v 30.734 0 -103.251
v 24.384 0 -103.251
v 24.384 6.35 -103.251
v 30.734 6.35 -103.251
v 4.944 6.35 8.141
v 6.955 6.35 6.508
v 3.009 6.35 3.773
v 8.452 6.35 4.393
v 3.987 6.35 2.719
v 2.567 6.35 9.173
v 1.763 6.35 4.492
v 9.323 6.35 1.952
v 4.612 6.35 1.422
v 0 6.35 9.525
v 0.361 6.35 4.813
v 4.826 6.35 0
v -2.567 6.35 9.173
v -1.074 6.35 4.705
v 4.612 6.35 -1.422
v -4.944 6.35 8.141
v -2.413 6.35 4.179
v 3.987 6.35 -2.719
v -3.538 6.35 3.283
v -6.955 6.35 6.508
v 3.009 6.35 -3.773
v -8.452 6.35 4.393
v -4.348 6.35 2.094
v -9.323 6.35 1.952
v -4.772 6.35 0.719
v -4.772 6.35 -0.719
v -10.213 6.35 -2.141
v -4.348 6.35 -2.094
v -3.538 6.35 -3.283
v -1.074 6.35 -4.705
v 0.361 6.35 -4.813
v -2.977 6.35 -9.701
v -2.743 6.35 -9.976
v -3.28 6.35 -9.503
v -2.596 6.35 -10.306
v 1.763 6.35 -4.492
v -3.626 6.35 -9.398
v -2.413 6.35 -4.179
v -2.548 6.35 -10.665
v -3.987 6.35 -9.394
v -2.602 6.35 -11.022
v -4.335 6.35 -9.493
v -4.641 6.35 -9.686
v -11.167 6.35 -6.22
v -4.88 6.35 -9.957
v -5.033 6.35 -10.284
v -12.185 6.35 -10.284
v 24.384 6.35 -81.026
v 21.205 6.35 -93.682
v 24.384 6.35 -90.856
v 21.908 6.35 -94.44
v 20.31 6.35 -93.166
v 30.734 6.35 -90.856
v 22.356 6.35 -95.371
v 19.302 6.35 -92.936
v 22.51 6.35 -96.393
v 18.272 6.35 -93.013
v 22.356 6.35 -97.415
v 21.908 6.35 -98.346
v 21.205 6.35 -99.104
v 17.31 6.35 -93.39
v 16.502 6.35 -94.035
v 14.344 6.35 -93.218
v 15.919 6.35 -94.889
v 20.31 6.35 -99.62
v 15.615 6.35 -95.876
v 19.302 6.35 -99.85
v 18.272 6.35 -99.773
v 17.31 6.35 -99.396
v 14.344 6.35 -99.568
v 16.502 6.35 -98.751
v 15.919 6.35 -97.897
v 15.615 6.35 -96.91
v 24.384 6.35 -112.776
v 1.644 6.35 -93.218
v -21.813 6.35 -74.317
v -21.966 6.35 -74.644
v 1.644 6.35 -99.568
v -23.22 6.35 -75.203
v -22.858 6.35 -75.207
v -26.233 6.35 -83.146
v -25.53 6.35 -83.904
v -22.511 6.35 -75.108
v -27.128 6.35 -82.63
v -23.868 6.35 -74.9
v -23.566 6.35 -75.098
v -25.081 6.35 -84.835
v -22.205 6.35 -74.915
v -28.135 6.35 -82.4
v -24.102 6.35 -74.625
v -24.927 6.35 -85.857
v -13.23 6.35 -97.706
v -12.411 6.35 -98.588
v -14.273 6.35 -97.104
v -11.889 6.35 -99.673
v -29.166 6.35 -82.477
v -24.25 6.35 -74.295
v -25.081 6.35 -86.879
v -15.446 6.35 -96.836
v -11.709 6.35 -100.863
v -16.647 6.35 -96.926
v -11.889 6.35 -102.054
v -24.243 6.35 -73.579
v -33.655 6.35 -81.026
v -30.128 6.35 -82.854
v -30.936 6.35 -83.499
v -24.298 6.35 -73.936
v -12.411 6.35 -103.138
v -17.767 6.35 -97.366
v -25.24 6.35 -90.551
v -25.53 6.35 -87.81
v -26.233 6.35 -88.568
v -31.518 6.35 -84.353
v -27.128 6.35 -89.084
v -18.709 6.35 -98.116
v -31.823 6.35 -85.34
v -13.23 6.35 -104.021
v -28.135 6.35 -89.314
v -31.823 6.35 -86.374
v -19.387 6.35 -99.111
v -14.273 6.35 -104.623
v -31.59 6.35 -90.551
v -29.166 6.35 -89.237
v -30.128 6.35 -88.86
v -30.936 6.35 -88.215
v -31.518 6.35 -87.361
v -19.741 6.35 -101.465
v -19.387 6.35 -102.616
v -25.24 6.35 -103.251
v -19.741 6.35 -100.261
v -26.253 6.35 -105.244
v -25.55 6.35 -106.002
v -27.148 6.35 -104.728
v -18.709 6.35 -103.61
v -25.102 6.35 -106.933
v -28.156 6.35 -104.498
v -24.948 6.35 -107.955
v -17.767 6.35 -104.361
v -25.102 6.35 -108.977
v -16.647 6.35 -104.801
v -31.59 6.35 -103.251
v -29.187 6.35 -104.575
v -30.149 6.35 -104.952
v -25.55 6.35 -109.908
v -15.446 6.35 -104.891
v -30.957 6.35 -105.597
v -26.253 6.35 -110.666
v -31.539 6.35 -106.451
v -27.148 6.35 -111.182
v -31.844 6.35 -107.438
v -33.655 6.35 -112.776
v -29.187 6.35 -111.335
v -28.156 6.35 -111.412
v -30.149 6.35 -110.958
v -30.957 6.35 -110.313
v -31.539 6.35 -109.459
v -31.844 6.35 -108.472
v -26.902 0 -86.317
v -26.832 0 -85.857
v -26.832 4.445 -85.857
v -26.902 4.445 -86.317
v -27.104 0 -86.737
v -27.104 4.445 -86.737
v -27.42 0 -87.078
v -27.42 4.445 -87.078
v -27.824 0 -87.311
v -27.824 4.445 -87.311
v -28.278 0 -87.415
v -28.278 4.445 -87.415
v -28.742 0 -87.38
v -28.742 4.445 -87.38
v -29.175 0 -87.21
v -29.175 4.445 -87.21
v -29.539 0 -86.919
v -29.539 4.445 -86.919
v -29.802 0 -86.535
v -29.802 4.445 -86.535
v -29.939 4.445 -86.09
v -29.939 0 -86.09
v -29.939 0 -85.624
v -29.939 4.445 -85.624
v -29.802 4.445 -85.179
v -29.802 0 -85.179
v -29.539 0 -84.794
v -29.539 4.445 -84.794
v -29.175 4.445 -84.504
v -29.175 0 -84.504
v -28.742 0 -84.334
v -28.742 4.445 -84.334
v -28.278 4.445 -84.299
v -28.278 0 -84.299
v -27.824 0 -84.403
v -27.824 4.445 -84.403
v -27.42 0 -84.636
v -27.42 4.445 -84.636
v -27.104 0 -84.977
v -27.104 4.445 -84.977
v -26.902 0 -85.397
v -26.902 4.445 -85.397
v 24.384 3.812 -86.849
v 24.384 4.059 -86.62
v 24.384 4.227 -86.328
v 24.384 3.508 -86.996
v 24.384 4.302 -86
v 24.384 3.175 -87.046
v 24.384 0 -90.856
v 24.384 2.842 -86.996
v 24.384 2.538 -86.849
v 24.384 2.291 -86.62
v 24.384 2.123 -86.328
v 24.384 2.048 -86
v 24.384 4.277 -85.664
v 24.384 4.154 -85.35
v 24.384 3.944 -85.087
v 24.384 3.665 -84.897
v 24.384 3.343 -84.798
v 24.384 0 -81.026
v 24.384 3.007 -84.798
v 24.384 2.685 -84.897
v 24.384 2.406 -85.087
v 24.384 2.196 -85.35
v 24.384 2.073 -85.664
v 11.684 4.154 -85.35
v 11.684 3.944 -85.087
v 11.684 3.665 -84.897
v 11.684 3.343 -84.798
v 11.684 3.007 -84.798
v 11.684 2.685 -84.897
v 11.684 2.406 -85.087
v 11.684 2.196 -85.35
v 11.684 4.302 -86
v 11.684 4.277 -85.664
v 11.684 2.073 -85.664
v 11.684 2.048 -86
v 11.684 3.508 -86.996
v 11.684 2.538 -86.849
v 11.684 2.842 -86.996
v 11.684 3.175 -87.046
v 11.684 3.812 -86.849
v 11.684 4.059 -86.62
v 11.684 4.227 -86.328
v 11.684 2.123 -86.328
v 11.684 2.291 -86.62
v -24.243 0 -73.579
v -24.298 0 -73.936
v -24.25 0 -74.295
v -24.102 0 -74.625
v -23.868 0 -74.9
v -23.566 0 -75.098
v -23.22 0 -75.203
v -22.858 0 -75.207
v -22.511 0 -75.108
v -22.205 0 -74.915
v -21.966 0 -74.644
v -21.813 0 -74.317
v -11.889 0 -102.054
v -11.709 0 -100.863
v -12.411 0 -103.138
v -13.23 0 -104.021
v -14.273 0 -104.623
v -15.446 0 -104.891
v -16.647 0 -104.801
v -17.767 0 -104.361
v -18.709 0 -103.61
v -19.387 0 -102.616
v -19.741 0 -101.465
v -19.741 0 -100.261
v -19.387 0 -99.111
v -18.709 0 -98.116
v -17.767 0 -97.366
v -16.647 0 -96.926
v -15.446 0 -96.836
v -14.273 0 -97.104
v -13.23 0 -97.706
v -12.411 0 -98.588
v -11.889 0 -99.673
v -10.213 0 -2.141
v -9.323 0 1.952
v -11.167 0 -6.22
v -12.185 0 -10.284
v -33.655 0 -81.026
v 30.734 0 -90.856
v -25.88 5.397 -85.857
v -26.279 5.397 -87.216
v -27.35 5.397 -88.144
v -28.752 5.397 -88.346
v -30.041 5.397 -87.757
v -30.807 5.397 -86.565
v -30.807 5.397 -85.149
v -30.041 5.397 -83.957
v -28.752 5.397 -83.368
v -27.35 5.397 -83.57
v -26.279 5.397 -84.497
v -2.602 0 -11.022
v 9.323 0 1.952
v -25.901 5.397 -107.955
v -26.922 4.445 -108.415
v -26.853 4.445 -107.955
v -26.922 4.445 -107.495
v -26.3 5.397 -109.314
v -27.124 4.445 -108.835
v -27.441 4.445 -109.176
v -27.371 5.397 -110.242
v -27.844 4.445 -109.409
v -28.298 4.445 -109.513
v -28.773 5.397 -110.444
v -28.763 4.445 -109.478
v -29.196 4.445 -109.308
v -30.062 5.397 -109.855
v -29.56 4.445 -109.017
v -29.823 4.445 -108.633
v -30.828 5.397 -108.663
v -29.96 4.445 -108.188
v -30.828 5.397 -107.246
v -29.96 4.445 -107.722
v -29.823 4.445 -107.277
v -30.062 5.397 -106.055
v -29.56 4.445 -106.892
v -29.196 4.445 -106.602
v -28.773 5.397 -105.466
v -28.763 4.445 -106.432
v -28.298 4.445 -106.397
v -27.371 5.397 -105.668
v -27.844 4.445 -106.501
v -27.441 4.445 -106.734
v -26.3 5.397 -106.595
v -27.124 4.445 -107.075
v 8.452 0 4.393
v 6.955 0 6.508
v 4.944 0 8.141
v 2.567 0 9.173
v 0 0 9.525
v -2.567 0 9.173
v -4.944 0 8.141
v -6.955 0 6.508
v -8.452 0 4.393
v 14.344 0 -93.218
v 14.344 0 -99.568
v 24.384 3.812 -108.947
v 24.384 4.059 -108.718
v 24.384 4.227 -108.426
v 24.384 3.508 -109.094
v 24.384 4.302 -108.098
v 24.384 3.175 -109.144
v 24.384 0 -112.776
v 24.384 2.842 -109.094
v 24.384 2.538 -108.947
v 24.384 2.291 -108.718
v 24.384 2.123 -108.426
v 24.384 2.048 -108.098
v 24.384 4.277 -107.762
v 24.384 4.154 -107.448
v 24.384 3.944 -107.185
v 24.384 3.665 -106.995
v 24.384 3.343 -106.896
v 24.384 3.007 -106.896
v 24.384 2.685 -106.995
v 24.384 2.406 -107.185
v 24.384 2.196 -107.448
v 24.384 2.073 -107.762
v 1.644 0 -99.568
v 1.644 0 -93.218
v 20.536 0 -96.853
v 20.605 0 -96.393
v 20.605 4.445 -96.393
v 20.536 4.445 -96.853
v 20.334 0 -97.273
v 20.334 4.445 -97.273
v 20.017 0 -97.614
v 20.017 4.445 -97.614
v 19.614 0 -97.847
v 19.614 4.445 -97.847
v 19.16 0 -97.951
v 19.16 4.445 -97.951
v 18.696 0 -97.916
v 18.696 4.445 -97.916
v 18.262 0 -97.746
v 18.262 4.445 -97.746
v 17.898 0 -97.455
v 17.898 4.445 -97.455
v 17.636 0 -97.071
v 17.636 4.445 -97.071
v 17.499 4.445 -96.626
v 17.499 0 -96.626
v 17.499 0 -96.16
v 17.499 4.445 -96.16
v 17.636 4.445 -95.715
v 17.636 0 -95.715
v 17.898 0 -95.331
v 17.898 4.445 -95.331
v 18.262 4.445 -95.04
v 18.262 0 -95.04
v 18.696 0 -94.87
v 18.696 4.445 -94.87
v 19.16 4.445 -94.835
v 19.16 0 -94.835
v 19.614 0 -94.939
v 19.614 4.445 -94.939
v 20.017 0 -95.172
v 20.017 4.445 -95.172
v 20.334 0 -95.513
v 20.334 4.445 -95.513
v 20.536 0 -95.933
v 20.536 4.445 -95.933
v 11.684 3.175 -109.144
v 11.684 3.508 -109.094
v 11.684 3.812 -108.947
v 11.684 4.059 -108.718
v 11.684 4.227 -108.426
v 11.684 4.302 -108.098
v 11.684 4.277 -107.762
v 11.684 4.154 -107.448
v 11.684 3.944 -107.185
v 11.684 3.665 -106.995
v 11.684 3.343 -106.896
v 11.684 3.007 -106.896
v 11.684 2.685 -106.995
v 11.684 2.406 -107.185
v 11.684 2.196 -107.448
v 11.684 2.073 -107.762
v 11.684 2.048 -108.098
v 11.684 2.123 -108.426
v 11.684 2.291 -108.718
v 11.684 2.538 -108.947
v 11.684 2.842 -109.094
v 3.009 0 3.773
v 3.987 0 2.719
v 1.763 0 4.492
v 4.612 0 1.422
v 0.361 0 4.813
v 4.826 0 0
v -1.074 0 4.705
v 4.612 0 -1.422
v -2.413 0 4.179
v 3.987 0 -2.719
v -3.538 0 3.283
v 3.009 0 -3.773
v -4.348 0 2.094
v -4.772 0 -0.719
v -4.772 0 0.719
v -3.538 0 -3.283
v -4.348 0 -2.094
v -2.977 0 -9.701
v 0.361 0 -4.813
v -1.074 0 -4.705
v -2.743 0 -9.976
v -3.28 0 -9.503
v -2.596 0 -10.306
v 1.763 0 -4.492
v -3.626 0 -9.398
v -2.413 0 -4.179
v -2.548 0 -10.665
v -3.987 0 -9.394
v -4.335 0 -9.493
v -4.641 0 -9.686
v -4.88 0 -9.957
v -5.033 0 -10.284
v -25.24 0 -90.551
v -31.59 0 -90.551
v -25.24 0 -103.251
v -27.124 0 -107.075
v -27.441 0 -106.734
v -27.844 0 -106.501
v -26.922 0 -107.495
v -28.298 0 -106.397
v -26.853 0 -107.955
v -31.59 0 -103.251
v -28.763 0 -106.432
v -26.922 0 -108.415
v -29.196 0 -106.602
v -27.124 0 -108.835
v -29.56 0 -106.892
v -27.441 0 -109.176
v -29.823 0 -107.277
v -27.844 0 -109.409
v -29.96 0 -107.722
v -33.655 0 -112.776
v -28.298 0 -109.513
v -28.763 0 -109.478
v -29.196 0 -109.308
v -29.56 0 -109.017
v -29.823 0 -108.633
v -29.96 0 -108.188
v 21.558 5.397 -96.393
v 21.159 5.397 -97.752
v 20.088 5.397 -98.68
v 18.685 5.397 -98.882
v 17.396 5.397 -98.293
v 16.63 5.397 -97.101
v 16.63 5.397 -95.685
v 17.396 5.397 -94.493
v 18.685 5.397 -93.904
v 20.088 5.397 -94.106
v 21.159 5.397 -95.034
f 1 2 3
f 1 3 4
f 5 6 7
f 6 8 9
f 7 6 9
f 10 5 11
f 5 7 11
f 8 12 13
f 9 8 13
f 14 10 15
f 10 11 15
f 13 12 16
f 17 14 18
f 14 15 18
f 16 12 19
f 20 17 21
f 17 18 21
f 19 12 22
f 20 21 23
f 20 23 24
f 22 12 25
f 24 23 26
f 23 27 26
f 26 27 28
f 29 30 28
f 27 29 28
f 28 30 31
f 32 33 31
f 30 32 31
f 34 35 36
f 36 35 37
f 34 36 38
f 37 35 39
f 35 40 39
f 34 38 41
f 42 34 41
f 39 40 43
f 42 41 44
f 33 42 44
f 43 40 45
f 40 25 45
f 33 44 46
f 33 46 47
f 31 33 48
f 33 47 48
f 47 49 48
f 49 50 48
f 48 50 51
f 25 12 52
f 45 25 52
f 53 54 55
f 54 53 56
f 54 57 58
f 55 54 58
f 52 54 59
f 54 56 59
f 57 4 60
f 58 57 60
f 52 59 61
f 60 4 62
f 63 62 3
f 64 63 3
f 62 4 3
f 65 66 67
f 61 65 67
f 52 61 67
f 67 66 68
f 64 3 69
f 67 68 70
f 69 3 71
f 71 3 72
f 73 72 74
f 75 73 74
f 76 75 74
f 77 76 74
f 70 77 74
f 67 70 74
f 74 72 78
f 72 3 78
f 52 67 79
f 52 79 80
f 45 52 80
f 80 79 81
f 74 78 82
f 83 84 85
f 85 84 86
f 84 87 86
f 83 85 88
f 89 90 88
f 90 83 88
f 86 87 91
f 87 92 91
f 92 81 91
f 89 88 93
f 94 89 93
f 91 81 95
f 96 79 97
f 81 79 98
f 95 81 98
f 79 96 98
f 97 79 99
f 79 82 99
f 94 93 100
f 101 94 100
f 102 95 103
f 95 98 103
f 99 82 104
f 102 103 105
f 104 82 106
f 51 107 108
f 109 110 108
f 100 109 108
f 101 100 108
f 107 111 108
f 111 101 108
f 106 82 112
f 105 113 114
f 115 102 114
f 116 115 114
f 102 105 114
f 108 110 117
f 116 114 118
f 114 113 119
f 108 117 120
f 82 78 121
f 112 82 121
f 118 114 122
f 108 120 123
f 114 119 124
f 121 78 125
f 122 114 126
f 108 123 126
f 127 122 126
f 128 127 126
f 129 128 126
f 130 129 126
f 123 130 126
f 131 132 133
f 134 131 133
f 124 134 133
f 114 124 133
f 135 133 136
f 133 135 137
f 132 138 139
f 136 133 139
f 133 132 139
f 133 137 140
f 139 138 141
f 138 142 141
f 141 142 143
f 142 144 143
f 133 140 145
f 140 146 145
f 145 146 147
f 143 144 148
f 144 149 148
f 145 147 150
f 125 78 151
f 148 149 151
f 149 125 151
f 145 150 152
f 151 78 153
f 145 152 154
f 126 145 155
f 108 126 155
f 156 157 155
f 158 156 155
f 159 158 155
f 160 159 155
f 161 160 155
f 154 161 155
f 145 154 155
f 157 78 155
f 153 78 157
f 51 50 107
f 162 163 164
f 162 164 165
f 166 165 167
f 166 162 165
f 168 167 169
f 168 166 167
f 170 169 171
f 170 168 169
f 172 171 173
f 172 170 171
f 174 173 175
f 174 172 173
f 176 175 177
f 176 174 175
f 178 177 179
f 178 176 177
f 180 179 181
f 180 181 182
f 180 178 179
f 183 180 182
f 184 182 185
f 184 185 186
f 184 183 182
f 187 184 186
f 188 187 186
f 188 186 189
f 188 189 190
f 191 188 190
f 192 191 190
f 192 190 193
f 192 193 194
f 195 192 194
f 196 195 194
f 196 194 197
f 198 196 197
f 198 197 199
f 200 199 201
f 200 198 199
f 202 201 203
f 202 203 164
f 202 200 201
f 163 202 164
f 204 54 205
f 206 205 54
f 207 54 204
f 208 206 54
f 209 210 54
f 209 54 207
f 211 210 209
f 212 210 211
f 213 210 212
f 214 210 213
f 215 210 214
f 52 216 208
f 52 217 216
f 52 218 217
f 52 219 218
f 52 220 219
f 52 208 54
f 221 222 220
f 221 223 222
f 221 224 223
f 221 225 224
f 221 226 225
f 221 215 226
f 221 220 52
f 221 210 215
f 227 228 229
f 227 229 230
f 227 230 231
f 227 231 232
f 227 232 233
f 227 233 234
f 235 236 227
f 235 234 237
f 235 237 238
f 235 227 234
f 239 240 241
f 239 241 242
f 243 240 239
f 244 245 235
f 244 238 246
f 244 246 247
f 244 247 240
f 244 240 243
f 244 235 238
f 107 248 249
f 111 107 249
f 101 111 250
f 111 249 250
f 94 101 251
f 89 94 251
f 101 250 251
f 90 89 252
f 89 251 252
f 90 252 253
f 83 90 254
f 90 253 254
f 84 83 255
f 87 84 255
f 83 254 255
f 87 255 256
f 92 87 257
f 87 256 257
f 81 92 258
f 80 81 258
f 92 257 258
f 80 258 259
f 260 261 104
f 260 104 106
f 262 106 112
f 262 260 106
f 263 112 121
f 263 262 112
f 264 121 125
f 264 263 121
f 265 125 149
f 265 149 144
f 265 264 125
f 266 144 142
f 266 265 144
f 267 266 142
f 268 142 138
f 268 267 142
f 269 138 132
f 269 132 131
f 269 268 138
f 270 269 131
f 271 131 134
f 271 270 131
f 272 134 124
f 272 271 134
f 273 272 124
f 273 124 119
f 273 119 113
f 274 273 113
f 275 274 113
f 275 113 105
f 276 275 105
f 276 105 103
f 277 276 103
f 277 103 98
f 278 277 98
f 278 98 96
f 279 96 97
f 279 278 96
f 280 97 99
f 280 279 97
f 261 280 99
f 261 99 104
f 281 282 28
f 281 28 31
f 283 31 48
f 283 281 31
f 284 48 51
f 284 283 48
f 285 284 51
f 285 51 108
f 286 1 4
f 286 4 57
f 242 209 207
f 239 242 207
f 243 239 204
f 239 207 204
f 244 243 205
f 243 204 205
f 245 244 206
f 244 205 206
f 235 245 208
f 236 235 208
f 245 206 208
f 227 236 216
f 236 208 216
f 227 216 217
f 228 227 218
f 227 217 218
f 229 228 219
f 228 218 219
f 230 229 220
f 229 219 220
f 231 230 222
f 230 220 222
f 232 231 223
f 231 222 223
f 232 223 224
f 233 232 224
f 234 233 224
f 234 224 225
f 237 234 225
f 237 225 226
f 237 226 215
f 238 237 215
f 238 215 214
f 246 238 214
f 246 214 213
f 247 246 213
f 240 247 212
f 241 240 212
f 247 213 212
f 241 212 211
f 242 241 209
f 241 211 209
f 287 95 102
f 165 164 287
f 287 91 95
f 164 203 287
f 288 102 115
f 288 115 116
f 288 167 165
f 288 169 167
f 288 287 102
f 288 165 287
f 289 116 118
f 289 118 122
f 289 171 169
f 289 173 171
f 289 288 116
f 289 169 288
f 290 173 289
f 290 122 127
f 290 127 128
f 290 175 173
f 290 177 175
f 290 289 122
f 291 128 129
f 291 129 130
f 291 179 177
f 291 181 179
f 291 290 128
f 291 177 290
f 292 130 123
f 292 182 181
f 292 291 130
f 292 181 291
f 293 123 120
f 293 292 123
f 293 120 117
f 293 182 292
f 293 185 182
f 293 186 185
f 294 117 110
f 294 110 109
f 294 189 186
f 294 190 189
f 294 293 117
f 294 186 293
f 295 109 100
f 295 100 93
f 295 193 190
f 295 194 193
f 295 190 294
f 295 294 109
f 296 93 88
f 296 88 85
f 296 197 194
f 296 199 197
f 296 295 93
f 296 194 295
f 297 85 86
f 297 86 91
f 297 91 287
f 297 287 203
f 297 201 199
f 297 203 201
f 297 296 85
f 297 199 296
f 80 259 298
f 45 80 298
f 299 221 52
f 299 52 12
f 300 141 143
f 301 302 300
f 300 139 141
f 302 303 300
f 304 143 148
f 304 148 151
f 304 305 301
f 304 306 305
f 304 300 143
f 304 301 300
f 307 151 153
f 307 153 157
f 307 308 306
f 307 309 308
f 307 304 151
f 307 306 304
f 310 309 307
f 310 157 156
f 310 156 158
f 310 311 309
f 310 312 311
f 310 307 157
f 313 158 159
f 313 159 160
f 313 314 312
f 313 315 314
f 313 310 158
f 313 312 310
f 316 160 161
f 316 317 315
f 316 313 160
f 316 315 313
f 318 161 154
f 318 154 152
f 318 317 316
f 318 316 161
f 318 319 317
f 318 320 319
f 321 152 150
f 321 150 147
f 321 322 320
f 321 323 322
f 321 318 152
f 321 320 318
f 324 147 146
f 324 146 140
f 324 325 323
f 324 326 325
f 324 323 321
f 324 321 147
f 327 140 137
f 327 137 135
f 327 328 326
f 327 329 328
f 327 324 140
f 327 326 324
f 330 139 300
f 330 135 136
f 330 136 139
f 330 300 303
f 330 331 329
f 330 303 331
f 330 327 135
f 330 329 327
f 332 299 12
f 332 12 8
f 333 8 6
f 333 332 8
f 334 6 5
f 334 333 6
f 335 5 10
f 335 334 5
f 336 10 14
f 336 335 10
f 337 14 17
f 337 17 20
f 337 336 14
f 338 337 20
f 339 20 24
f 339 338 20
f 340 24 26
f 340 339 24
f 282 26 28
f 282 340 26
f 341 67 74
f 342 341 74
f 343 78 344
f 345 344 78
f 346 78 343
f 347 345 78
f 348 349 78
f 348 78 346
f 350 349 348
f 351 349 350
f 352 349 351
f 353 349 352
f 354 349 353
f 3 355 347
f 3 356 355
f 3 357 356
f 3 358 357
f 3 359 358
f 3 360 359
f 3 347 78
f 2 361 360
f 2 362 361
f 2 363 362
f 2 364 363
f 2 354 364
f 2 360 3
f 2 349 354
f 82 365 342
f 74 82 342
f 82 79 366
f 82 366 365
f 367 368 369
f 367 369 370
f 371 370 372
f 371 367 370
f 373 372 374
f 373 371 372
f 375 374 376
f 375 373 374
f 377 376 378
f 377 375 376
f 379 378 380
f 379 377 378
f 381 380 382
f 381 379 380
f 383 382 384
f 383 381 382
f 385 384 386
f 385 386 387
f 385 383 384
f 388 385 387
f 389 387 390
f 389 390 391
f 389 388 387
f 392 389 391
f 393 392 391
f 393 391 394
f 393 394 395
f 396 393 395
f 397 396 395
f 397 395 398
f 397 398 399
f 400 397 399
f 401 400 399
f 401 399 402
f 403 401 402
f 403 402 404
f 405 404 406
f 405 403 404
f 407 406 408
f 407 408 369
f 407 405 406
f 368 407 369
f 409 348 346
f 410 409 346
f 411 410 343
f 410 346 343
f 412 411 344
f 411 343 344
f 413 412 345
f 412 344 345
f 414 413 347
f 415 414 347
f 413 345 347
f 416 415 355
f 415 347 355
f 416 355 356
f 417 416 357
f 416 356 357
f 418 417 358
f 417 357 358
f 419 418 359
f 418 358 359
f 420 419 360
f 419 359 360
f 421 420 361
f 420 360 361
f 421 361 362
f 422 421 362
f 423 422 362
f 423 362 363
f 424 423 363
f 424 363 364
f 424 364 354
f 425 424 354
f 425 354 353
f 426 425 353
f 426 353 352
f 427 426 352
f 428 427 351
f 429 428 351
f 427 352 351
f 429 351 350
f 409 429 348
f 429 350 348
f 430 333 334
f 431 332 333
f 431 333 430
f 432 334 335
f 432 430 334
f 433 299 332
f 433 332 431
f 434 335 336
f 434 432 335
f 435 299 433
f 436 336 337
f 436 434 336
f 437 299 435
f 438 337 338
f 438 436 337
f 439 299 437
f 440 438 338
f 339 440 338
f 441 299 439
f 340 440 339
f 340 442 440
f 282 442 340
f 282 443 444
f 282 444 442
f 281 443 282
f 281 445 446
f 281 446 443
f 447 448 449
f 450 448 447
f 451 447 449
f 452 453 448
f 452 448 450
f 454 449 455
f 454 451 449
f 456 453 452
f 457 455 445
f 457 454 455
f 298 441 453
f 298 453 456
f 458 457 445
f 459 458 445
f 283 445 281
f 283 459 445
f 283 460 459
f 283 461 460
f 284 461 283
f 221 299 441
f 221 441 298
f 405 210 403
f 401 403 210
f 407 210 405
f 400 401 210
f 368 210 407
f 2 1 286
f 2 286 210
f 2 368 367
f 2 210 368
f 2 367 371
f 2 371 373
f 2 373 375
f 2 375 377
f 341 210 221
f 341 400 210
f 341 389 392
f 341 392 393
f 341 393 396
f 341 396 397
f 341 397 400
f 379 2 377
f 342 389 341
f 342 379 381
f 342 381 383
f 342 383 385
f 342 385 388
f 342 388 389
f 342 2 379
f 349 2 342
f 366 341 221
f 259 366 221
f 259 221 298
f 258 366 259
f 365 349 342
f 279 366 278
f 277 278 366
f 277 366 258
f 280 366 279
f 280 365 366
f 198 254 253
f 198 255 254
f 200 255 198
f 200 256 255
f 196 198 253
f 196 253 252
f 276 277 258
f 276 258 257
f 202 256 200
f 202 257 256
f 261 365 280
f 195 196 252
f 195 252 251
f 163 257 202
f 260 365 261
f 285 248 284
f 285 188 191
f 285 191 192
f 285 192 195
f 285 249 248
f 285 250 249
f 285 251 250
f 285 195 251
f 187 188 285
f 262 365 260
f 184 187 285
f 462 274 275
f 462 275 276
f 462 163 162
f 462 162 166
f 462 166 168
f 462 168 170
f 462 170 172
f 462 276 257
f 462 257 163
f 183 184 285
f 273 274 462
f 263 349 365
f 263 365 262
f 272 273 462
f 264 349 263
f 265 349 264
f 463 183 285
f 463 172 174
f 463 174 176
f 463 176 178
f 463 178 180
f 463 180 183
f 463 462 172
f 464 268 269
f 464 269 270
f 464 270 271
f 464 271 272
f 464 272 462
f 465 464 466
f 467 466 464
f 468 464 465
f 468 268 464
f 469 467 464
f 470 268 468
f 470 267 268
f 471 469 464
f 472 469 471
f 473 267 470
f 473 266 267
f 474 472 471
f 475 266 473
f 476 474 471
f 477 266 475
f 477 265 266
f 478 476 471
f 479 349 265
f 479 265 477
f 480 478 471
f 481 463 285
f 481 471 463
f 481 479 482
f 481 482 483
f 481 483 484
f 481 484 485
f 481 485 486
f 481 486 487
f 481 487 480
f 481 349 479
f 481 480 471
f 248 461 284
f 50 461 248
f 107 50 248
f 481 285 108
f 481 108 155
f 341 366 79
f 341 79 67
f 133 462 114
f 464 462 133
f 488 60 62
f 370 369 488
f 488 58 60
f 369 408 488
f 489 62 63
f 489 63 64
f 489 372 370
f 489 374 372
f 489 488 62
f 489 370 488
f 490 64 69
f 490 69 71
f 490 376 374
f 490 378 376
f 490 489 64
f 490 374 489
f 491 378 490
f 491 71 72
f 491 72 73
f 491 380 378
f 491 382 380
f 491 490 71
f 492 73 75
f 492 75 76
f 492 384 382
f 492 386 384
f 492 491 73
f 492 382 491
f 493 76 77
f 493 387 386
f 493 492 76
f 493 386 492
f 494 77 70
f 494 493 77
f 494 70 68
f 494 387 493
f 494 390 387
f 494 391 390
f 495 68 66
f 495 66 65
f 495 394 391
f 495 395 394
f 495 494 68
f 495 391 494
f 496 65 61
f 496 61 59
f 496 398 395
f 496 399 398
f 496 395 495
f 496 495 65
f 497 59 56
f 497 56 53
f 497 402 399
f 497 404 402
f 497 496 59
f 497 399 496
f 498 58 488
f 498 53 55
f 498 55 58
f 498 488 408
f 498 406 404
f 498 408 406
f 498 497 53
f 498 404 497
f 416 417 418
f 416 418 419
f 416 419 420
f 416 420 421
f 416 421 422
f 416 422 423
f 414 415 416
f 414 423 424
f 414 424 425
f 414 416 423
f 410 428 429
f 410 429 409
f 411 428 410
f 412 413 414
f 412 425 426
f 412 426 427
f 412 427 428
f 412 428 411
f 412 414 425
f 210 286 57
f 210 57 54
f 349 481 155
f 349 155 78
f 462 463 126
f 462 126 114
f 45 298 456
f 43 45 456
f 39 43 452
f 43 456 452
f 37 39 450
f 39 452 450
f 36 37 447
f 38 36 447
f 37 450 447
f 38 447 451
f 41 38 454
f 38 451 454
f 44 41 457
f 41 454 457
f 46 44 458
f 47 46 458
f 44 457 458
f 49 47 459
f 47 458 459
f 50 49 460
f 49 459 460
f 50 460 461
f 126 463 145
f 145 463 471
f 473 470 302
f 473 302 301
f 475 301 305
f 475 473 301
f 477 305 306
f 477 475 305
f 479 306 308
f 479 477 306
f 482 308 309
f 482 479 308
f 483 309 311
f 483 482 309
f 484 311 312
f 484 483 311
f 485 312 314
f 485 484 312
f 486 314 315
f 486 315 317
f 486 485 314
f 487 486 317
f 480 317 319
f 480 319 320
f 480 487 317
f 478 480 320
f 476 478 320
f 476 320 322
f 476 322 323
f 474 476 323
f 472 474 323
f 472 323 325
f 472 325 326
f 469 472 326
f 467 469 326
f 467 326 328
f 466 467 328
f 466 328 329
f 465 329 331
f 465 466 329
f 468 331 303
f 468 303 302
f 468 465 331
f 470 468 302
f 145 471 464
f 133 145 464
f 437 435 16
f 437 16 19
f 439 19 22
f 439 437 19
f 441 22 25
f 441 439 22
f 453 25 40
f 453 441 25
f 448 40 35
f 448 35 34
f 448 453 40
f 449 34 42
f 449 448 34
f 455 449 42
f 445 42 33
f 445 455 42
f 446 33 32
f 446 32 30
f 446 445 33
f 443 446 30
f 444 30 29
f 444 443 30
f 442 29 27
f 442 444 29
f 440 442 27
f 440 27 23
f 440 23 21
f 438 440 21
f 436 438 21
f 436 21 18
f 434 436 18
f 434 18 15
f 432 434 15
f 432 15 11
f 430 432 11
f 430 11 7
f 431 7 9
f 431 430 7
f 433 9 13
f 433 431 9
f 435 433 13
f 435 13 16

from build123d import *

# Parameters (mm, degrees)
SKETCH1_R           = 4.826
SKETCH1_R_2         = 1.5621
SKETCH1_R_3         = 4.0386
SKETCH1_W           = 12.7
SKETCH1_H           = 6.35
SKETCH1_W_2         = 6.35
SKETCH1_H_2         = 12.7
BOSS_EXTRUDE1_DEPTH = 6.35
SKETCH2_R           = 1.1303
CUT_EXTRUDE1_DEPTH  = 12.7
CHAMFER1_SIZE       = 1.905


with BuildPart() as part:
    # Sketch1 → Boss-Extrude1 (new body)
    with BuildSketch(Plane(origin=(0, 0, 0), x_dir=(1, 0, 0), z_dir=(0, 1, 0))):
        with BuildLine():
            Line((24.384, 81.026), (9.322766338, -1.952345462))
            ThreePointArc((9.322766338, -1.952345462), (0, -9.525), (-9.322766338, -1.952345462))
            ThreePointArc((-9.322766338, -1.952345462), (-10.68238726, 4.182597127), (-12.184698283, 10.284166696))
            Line((-12.184698283, 10.284166696), (-33.655, 81.026))
            Line((-33.655, 81.026), (-33.655, 112.776))
            Line((-33.655, 112.776), (-30.48, 112.776))
            Line((-30.48, 112.776), (24.384, 112.776))
            Line((24.384, 112.776), (24.384, 103.251))
            Line((24.384, 103.251), (30.734, 103.251))
            Line((30.734, 103.251), (30.734, 90.8558))
            Line((30.734, 90.8558), (24.384, 90.8558))
            Line((24.384, 90.8558), (24.384, 81.026))
        make_face()
        Circle(SKETCH1_R, mode=Mode.SUBTRACT)
        with Locations((-28.415132449, 107.954943271)):
            Circle(SKETCH1_R_2, mode=Mode.SUBTRACT)
        with Locations((-28.394285298, 85.856962938)):
            Circle(SKETCH1_R_2, mode=Mode.SUBTRACT)
        with Locations((-15.748, 100.8634)):
            Circle(SKETCH1_R_3, mode=Mode.SUBTRACT)
        with Locations((19.043196245, 96.393)):
            Circle(SKETCH1_R_2, mode=Mode.SUBTRACT)
        with BuildLine():
            Line((-5.032922832, 10.284166696), (-24.24305587, 73.5790401))
            ThreePointArc((-24.24305587, 73.5790401), (-23.396628753, 75.163136415), (-21.812532438, 74.316709298))
            Line((-21.812532438, 74.316709298), (-2.6023994, 11.021835893))
            ThreePointArc((-2.6023994, 11.021835893), (-3.448826517, 9.437739578), (-5.032922832, 10.284166696))
        make_face(mode=Mode.SUBTRACT)
        with Locations((7.994206079, 96.393)):
            Rectangle(SKETCH1_W, SKETCH1_H, mode=Mode.SUBTRACT)
        with Locations((-28.415132449, 96.901)):
            Rectangle(SKETCH1_W_2, SKETCH1_H_2, mode=Mode.SUBTRACT)
    extrude(amount=BOSS_EXTRUDE1_DEPTH)

    # Sketch2 → Cut-Extrude1 (cut)
    with BuildSketch(Plane(origin=(24.384, 0, 0), x_dir=(0, 0, -1), z_dir=(1, 0, 0))):
        with Locations((108.0135, 3.175)):
            Circle(SKETCH2_R)
        with Locations((85.9155, 3.175)):
            Circle(SKETCH2_R)
    extrude(amount=-CUT_EXTRUDE1_DEPTH, mode=Mode.SUBTRACT)

    # Chamfer1
    chamfer1_edges = [part.edges().sort_by_distance(p)[0] for p in [
        (17.481096245, 6.35, -96.393),
        (-29.977232449, 6.35, -107.954943271),
        (-29.956385298, 6.35, -85.856962938),
    ]]
    chamfer(chamfer1_edges, length=CHAMFER1_SIZE)


solid = part.part
